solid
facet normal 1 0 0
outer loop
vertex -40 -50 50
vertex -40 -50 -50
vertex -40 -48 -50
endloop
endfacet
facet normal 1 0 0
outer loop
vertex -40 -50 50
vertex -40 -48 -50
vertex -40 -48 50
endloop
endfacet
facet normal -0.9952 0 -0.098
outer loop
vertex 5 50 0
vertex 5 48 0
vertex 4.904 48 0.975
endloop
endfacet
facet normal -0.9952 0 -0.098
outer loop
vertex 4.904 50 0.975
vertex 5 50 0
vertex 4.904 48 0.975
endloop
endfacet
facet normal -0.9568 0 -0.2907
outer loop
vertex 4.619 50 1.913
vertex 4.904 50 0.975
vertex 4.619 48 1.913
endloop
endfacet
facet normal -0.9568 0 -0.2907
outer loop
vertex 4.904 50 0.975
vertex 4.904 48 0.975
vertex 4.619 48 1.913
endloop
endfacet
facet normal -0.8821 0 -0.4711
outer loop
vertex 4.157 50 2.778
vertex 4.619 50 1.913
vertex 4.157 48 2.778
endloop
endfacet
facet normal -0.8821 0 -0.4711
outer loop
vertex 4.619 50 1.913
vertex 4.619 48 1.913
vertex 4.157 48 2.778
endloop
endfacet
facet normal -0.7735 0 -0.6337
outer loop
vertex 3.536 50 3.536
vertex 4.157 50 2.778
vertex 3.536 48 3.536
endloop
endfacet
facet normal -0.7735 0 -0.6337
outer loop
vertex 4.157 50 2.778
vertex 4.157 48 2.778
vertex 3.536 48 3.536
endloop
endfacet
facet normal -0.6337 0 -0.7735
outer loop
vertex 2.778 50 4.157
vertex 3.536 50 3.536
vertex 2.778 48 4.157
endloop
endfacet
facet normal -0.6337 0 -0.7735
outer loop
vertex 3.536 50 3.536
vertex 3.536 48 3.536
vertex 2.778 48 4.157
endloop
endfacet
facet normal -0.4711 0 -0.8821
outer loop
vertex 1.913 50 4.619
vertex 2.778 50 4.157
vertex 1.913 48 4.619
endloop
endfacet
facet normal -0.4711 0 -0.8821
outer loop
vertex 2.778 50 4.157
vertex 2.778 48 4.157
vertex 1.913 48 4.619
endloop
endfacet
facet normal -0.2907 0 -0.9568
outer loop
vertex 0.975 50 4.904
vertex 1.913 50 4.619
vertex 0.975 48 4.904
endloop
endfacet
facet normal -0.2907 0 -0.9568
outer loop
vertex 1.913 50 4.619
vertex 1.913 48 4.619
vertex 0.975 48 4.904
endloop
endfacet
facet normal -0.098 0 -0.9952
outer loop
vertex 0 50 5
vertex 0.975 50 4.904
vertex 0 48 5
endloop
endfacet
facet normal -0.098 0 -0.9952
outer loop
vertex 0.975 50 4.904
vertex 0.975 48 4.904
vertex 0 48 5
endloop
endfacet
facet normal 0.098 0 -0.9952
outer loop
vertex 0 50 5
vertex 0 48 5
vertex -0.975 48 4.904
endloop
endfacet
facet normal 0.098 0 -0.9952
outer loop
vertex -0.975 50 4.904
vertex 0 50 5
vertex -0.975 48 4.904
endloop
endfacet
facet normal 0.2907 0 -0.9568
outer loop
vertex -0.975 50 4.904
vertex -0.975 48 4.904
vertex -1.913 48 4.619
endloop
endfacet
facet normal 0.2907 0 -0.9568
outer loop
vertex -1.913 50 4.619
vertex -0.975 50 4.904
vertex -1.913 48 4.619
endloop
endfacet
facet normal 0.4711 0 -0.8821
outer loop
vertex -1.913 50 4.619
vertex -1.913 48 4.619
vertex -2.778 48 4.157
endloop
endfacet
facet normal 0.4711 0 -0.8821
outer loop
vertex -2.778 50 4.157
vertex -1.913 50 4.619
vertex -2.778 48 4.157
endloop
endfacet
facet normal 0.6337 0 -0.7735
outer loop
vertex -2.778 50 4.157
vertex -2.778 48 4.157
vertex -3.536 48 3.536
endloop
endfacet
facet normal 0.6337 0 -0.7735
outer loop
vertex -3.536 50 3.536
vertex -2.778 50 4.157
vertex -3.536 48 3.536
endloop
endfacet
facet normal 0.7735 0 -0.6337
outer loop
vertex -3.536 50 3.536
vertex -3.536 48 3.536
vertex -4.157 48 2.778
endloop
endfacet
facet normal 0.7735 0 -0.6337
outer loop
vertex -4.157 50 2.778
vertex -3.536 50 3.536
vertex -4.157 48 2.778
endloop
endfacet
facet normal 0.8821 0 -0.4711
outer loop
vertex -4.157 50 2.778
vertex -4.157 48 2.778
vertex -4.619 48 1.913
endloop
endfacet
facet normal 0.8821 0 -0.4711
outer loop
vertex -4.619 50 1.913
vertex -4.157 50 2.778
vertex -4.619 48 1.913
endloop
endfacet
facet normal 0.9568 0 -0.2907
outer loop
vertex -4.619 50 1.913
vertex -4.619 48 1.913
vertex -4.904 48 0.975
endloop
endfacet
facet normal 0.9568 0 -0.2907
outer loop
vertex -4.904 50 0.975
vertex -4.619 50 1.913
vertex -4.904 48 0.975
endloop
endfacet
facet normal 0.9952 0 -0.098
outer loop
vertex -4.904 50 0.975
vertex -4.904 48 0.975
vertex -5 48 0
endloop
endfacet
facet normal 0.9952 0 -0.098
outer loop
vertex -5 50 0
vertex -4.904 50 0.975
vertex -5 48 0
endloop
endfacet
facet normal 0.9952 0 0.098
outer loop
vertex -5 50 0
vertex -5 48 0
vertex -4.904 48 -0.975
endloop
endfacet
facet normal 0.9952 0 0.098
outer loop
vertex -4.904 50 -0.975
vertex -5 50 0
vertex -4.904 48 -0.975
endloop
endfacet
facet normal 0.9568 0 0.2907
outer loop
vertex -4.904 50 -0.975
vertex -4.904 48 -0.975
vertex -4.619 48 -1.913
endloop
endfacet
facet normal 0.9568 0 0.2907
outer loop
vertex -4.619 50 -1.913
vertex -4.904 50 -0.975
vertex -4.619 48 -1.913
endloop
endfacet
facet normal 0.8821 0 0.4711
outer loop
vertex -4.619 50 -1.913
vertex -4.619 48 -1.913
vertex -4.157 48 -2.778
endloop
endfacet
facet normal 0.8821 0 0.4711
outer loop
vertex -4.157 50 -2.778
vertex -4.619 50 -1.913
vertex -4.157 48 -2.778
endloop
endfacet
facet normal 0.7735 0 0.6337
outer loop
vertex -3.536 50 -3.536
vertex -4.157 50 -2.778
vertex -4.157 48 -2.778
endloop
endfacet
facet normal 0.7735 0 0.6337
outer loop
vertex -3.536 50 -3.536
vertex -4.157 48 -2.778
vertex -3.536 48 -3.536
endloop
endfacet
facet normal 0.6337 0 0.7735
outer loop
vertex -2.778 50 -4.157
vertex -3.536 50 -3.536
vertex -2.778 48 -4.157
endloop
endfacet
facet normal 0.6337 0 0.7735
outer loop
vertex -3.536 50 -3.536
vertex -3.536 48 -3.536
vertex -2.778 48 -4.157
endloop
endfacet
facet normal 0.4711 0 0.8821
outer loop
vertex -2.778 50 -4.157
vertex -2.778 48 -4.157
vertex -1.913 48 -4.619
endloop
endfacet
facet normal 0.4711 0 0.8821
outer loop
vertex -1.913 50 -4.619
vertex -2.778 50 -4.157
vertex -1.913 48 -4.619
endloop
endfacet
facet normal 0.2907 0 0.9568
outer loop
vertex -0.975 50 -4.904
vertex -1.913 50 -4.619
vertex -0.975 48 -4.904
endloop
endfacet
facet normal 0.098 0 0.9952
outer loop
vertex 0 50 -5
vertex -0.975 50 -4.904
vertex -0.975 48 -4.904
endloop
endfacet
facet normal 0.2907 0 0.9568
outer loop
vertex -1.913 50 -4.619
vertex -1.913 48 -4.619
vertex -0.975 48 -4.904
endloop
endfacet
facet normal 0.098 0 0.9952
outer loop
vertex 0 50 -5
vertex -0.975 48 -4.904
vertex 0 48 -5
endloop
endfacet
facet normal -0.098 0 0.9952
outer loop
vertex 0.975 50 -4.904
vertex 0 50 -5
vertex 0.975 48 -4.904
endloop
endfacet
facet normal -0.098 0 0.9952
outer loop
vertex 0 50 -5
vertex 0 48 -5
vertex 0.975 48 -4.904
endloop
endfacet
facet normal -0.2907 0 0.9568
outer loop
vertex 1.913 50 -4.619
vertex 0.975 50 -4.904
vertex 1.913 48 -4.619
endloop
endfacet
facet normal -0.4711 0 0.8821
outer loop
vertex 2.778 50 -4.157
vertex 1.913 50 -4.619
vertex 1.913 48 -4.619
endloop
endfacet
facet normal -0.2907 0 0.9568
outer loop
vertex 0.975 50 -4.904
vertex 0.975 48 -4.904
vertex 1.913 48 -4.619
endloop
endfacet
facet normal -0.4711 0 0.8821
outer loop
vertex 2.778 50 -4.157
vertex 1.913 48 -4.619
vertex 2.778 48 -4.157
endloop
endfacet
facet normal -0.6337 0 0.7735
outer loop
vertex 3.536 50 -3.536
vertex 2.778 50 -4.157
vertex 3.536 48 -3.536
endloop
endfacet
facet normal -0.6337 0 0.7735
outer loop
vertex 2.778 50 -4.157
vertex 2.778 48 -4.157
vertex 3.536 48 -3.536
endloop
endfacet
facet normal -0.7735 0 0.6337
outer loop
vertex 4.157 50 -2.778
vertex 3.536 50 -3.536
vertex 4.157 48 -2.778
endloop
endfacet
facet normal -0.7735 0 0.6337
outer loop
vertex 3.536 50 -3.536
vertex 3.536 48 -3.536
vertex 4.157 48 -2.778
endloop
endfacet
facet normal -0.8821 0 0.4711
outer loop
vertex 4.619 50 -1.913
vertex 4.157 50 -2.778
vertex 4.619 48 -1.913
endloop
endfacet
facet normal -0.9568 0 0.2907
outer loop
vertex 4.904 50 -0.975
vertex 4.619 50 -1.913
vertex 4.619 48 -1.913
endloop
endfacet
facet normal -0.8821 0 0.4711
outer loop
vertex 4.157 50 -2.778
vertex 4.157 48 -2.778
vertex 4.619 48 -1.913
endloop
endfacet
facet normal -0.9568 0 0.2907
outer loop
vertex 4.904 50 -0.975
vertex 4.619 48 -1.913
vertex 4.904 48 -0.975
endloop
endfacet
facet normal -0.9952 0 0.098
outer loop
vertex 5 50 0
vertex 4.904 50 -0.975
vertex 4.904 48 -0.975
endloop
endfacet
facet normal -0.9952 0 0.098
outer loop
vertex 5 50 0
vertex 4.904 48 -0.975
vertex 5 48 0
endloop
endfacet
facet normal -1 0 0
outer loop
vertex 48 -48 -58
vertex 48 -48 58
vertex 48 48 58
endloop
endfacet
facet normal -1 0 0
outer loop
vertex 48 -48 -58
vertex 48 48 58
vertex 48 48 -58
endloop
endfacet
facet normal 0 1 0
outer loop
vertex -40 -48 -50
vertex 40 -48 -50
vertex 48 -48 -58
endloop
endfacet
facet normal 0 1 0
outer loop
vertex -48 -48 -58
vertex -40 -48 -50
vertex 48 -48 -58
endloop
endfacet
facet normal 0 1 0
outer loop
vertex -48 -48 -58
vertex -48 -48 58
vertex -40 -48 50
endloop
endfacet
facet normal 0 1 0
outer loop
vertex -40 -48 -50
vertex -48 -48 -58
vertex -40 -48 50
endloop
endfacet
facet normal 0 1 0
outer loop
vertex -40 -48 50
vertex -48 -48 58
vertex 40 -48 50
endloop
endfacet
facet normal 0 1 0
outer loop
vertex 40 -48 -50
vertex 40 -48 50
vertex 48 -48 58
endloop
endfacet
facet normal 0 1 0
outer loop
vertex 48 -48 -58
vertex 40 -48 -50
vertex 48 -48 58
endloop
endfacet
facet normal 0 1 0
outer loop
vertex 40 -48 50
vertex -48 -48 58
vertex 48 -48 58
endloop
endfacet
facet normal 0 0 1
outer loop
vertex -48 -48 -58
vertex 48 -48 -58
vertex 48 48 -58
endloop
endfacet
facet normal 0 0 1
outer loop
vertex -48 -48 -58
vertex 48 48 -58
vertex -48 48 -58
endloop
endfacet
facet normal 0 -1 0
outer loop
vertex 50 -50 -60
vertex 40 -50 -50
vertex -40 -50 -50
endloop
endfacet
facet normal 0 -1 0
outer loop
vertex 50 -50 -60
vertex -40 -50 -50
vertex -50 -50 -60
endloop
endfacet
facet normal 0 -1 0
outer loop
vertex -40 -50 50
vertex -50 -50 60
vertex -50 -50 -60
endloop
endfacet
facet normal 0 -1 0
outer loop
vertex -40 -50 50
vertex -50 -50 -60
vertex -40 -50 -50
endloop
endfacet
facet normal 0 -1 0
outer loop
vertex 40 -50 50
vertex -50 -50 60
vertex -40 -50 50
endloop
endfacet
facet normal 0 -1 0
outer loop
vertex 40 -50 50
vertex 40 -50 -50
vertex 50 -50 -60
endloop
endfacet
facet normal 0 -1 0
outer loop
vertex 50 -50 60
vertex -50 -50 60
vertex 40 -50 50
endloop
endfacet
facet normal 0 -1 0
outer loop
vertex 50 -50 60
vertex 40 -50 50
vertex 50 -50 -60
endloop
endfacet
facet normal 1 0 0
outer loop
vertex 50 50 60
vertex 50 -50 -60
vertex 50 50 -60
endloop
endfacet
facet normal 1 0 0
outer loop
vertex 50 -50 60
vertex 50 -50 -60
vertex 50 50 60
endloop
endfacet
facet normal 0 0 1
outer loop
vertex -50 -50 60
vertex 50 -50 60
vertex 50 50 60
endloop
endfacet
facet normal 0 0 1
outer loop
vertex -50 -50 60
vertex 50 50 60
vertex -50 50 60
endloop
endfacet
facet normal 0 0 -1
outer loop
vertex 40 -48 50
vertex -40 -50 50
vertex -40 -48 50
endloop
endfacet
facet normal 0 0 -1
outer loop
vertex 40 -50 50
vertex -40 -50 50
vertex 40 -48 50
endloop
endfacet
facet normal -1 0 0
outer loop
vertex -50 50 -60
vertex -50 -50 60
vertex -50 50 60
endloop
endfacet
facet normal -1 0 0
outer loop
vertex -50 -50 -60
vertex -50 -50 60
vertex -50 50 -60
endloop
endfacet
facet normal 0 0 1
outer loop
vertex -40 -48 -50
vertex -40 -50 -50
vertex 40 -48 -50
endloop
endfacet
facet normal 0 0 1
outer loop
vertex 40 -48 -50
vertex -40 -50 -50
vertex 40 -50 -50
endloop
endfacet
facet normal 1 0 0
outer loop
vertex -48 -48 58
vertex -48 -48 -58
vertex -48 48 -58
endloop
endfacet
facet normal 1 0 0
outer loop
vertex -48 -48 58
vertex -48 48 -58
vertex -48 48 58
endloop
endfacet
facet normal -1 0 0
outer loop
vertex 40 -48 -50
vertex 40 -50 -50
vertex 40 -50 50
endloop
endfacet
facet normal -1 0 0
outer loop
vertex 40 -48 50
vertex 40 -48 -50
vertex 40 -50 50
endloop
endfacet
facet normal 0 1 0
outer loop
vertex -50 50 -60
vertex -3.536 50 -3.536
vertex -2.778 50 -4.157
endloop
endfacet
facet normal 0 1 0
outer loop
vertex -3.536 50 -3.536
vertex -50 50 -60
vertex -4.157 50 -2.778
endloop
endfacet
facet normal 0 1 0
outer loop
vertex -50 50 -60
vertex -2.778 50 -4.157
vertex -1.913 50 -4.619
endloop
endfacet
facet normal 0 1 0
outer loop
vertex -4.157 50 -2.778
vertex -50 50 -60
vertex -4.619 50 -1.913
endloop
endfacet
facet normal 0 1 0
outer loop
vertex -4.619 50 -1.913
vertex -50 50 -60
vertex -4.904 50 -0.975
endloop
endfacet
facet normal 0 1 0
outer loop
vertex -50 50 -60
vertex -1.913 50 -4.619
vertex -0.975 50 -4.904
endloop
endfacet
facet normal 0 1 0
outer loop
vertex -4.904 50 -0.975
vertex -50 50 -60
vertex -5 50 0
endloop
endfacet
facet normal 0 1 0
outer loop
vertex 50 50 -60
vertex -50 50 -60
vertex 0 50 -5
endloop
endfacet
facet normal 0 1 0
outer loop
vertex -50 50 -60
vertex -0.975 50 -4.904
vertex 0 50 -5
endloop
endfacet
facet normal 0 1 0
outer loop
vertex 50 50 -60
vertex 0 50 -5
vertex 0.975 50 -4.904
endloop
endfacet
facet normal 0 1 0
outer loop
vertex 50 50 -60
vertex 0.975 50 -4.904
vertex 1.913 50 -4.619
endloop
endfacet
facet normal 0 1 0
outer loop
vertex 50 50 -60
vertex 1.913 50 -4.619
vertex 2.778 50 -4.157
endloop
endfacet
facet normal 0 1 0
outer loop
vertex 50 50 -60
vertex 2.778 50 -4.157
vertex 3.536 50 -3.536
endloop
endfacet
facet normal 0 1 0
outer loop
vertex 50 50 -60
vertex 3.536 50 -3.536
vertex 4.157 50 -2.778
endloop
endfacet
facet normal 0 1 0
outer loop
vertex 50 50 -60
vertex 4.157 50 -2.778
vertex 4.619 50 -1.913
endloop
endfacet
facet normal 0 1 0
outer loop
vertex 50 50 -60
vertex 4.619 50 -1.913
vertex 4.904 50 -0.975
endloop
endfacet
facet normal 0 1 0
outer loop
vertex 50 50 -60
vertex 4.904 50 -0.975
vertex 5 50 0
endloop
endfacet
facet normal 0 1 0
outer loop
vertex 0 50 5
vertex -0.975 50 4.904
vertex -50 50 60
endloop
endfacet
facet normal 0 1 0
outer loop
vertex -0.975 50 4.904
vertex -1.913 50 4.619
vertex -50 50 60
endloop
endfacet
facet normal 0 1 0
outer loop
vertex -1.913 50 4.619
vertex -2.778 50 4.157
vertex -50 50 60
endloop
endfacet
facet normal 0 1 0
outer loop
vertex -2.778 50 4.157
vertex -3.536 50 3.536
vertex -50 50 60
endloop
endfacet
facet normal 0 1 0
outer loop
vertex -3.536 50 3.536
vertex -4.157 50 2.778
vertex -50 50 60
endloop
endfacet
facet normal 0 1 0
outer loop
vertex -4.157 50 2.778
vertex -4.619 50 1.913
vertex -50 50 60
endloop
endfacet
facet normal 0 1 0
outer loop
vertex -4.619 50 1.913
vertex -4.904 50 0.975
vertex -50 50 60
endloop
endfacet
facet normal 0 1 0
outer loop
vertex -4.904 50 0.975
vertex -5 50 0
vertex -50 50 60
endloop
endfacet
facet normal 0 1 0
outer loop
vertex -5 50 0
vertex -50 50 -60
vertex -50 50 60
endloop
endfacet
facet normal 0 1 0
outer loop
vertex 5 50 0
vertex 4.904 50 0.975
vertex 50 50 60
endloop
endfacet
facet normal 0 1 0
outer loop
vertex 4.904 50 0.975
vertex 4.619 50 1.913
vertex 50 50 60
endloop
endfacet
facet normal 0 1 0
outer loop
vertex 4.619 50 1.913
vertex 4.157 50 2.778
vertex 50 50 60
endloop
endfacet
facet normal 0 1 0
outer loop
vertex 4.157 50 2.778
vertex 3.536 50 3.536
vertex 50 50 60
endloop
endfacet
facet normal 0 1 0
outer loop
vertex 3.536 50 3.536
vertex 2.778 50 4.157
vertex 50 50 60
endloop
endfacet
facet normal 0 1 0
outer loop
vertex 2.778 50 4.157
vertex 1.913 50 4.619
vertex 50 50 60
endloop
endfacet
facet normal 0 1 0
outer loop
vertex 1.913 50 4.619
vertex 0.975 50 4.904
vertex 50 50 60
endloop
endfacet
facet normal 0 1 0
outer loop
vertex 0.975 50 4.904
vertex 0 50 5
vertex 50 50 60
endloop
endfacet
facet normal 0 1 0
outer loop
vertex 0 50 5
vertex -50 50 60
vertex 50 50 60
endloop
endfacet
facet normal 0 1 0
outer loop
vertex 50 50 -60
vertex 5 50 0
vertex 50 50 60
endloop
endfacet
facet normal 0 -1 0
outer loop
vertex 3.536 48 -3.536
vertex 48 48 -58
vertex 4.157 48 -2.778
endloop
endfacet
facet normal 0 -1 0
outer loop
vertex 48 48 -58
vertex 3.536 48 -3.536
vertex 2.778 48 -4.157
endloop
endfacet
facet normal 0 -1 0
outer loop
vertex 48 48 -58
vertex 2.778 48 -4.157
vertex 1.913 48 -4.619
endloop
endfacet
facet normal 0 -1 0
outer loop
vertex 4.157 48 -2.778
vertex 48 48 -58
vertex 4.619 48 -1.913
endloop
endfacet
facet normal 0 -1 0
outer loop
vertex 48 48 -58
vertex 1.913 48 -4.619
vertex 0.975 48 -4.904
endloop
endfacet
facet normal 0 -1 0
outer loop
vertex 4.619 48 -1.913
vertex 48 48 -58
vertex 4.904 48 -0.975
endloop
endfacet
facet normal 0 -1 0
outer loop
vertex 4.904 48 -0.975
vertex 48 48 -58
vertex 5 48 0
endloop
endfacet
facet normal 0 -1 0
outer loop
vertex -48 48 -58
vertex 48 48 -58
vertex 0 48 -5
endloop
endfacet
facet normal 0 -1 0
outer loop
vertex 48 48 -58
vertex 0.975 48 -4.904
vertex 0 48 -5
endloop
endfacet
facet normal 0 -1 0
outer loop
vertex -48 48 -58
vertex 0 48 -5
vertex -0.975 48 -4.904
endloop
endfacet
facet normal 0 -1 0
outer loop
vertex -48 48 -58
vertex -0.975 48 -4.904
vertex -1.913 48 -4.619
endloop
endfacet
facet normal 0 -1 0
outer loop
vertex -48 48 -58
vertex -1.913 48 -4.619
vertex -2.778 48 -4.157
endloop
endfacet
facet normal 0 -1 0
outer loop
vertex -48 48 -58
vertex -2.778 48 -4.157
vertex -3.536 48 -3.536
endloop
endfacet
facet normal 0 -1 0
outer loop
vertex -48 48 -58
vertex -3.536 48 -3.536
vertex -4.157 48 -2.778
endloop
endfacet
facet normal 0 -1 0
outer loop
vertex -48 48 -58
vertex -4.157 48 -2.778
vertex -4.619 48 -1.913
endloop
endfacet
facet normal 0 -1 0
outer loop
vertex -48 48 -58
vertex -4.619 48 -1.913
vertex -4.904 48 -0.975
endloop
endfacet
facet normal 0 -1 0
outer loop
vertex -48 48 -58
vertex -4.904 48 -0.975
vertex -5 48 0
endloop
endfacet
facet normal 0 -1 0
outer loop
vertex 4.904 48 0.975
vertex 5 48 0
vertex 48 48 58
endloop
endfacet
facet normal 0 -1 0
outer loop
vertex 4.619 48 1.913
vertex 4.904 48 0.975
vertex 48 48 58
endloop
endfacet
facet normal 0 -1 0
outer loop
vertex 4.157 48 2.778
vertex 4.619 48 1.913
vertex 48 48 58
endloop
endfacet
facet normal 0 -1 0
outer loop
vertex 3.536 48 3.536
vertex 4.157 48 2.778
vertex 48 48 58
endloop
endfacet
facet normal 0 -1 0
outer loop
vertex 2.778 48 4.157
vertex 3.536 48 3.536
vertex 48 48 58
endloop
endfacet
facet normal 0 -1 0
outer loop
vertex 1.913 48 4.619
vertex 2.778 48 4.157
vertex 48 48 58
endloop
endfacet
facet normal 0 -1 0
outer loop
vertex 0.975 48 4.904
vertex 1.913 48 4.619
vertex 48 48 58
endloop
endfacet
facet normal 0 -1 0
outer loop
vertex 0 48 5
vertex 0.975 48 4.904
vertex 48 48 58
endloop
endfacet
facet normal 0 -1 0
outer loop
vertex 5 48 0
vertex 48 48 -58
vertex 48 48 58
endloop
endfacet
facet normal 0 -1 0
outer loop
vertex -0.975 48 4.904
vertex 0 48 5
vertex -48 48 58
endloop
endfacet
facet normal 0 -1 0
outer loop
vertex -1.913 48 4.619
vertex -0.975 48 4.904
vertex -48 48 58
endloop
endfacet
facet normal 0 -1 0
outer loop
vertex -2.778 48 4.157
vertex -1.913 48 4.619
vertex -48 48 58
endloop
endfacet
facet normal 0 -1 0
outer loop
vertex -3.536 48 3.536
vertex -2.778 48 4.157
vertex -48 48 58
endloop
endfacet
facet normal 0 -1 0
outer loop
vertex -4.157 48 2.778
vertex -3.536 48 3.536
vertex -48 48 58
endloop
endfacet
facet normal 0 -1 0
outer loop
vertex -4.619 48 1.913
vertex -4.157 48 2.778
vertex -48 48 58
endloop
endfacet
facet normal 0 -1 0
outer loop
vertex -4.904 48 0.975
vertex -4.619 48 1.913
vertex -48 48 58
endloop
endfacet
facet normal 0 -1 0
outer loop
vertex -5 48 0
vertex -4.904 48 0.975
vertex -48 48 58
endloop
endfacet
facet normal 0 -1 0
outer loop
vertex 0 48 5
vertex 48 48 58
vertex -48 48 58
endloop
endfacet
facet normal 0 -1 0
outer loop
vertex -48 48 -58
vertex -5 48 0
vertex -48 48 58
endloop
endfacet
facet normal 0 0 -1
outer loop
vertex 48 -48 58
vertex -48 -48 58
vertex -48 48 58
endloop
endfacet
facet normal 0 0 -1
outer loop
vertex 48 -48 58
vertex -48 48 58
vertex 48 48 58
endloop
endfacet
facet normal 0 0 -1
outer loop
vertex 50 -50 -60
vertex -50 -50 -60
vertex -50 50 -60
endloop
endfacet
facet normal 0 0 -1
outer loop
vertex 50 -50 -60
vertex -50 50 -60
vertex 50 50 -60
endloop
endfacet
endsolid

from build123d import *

# Parameters (mm, degrees)
F1_DEPTH = 50
F2_W     = 100
F2_H     = 120
F3_DEPTH = 2
F5_D     = 10
F6_W     = 79.999998
F6_H     = 100.000001
F7_DEPTH = 2


with BuildPart() as f1:
    # F0 (on Front) → F1 (new body, symmetric)
    with BuildSketch(Plane.XZ):
        Polygon((50, -60), (50, 0), (50, 60), (-50, 60), (-50, -60), align=None)
        Polygon((-48, -58), (-48, 58), (48, 58), (48, 0), (48, -58), align=None, mode=Mode.SUBTRACT)
    extrude(amount=F1_DEPTH, both=True)

    # F2 (on face) → F3 (join)
    with BuildSketch(Plane(origin=(0, 50, 0), x_dir=(-1, 0, 0), z_dir=(0, 1, 0))):
        Rectangle(F2_W, F2_H)
    extrude(amount=-F3_DEPTH)

    # F5 (through all)
    with Locations(Plane(origin=(0, 50, 0), x_dir=(-1, 0, 0), z_dir=(0, 1, 0))):
        with Locations((0, 0)):
            Hole(F5_D / 2)

    # F6 (on face) → F7 (join)
    with BuildSketch(Plane.XZ.offset(50)):
        Polygon((50, 55), (50, 60), (-50, 60), (-50, -60), (50, -60), align=None)
        with Locations((0, 0)):
            Rectangle(F6_W, F6_H, mode=Mode.SUBTRACT)
    extrude(amount=-F7_DEPTH)


solid = f1.part
